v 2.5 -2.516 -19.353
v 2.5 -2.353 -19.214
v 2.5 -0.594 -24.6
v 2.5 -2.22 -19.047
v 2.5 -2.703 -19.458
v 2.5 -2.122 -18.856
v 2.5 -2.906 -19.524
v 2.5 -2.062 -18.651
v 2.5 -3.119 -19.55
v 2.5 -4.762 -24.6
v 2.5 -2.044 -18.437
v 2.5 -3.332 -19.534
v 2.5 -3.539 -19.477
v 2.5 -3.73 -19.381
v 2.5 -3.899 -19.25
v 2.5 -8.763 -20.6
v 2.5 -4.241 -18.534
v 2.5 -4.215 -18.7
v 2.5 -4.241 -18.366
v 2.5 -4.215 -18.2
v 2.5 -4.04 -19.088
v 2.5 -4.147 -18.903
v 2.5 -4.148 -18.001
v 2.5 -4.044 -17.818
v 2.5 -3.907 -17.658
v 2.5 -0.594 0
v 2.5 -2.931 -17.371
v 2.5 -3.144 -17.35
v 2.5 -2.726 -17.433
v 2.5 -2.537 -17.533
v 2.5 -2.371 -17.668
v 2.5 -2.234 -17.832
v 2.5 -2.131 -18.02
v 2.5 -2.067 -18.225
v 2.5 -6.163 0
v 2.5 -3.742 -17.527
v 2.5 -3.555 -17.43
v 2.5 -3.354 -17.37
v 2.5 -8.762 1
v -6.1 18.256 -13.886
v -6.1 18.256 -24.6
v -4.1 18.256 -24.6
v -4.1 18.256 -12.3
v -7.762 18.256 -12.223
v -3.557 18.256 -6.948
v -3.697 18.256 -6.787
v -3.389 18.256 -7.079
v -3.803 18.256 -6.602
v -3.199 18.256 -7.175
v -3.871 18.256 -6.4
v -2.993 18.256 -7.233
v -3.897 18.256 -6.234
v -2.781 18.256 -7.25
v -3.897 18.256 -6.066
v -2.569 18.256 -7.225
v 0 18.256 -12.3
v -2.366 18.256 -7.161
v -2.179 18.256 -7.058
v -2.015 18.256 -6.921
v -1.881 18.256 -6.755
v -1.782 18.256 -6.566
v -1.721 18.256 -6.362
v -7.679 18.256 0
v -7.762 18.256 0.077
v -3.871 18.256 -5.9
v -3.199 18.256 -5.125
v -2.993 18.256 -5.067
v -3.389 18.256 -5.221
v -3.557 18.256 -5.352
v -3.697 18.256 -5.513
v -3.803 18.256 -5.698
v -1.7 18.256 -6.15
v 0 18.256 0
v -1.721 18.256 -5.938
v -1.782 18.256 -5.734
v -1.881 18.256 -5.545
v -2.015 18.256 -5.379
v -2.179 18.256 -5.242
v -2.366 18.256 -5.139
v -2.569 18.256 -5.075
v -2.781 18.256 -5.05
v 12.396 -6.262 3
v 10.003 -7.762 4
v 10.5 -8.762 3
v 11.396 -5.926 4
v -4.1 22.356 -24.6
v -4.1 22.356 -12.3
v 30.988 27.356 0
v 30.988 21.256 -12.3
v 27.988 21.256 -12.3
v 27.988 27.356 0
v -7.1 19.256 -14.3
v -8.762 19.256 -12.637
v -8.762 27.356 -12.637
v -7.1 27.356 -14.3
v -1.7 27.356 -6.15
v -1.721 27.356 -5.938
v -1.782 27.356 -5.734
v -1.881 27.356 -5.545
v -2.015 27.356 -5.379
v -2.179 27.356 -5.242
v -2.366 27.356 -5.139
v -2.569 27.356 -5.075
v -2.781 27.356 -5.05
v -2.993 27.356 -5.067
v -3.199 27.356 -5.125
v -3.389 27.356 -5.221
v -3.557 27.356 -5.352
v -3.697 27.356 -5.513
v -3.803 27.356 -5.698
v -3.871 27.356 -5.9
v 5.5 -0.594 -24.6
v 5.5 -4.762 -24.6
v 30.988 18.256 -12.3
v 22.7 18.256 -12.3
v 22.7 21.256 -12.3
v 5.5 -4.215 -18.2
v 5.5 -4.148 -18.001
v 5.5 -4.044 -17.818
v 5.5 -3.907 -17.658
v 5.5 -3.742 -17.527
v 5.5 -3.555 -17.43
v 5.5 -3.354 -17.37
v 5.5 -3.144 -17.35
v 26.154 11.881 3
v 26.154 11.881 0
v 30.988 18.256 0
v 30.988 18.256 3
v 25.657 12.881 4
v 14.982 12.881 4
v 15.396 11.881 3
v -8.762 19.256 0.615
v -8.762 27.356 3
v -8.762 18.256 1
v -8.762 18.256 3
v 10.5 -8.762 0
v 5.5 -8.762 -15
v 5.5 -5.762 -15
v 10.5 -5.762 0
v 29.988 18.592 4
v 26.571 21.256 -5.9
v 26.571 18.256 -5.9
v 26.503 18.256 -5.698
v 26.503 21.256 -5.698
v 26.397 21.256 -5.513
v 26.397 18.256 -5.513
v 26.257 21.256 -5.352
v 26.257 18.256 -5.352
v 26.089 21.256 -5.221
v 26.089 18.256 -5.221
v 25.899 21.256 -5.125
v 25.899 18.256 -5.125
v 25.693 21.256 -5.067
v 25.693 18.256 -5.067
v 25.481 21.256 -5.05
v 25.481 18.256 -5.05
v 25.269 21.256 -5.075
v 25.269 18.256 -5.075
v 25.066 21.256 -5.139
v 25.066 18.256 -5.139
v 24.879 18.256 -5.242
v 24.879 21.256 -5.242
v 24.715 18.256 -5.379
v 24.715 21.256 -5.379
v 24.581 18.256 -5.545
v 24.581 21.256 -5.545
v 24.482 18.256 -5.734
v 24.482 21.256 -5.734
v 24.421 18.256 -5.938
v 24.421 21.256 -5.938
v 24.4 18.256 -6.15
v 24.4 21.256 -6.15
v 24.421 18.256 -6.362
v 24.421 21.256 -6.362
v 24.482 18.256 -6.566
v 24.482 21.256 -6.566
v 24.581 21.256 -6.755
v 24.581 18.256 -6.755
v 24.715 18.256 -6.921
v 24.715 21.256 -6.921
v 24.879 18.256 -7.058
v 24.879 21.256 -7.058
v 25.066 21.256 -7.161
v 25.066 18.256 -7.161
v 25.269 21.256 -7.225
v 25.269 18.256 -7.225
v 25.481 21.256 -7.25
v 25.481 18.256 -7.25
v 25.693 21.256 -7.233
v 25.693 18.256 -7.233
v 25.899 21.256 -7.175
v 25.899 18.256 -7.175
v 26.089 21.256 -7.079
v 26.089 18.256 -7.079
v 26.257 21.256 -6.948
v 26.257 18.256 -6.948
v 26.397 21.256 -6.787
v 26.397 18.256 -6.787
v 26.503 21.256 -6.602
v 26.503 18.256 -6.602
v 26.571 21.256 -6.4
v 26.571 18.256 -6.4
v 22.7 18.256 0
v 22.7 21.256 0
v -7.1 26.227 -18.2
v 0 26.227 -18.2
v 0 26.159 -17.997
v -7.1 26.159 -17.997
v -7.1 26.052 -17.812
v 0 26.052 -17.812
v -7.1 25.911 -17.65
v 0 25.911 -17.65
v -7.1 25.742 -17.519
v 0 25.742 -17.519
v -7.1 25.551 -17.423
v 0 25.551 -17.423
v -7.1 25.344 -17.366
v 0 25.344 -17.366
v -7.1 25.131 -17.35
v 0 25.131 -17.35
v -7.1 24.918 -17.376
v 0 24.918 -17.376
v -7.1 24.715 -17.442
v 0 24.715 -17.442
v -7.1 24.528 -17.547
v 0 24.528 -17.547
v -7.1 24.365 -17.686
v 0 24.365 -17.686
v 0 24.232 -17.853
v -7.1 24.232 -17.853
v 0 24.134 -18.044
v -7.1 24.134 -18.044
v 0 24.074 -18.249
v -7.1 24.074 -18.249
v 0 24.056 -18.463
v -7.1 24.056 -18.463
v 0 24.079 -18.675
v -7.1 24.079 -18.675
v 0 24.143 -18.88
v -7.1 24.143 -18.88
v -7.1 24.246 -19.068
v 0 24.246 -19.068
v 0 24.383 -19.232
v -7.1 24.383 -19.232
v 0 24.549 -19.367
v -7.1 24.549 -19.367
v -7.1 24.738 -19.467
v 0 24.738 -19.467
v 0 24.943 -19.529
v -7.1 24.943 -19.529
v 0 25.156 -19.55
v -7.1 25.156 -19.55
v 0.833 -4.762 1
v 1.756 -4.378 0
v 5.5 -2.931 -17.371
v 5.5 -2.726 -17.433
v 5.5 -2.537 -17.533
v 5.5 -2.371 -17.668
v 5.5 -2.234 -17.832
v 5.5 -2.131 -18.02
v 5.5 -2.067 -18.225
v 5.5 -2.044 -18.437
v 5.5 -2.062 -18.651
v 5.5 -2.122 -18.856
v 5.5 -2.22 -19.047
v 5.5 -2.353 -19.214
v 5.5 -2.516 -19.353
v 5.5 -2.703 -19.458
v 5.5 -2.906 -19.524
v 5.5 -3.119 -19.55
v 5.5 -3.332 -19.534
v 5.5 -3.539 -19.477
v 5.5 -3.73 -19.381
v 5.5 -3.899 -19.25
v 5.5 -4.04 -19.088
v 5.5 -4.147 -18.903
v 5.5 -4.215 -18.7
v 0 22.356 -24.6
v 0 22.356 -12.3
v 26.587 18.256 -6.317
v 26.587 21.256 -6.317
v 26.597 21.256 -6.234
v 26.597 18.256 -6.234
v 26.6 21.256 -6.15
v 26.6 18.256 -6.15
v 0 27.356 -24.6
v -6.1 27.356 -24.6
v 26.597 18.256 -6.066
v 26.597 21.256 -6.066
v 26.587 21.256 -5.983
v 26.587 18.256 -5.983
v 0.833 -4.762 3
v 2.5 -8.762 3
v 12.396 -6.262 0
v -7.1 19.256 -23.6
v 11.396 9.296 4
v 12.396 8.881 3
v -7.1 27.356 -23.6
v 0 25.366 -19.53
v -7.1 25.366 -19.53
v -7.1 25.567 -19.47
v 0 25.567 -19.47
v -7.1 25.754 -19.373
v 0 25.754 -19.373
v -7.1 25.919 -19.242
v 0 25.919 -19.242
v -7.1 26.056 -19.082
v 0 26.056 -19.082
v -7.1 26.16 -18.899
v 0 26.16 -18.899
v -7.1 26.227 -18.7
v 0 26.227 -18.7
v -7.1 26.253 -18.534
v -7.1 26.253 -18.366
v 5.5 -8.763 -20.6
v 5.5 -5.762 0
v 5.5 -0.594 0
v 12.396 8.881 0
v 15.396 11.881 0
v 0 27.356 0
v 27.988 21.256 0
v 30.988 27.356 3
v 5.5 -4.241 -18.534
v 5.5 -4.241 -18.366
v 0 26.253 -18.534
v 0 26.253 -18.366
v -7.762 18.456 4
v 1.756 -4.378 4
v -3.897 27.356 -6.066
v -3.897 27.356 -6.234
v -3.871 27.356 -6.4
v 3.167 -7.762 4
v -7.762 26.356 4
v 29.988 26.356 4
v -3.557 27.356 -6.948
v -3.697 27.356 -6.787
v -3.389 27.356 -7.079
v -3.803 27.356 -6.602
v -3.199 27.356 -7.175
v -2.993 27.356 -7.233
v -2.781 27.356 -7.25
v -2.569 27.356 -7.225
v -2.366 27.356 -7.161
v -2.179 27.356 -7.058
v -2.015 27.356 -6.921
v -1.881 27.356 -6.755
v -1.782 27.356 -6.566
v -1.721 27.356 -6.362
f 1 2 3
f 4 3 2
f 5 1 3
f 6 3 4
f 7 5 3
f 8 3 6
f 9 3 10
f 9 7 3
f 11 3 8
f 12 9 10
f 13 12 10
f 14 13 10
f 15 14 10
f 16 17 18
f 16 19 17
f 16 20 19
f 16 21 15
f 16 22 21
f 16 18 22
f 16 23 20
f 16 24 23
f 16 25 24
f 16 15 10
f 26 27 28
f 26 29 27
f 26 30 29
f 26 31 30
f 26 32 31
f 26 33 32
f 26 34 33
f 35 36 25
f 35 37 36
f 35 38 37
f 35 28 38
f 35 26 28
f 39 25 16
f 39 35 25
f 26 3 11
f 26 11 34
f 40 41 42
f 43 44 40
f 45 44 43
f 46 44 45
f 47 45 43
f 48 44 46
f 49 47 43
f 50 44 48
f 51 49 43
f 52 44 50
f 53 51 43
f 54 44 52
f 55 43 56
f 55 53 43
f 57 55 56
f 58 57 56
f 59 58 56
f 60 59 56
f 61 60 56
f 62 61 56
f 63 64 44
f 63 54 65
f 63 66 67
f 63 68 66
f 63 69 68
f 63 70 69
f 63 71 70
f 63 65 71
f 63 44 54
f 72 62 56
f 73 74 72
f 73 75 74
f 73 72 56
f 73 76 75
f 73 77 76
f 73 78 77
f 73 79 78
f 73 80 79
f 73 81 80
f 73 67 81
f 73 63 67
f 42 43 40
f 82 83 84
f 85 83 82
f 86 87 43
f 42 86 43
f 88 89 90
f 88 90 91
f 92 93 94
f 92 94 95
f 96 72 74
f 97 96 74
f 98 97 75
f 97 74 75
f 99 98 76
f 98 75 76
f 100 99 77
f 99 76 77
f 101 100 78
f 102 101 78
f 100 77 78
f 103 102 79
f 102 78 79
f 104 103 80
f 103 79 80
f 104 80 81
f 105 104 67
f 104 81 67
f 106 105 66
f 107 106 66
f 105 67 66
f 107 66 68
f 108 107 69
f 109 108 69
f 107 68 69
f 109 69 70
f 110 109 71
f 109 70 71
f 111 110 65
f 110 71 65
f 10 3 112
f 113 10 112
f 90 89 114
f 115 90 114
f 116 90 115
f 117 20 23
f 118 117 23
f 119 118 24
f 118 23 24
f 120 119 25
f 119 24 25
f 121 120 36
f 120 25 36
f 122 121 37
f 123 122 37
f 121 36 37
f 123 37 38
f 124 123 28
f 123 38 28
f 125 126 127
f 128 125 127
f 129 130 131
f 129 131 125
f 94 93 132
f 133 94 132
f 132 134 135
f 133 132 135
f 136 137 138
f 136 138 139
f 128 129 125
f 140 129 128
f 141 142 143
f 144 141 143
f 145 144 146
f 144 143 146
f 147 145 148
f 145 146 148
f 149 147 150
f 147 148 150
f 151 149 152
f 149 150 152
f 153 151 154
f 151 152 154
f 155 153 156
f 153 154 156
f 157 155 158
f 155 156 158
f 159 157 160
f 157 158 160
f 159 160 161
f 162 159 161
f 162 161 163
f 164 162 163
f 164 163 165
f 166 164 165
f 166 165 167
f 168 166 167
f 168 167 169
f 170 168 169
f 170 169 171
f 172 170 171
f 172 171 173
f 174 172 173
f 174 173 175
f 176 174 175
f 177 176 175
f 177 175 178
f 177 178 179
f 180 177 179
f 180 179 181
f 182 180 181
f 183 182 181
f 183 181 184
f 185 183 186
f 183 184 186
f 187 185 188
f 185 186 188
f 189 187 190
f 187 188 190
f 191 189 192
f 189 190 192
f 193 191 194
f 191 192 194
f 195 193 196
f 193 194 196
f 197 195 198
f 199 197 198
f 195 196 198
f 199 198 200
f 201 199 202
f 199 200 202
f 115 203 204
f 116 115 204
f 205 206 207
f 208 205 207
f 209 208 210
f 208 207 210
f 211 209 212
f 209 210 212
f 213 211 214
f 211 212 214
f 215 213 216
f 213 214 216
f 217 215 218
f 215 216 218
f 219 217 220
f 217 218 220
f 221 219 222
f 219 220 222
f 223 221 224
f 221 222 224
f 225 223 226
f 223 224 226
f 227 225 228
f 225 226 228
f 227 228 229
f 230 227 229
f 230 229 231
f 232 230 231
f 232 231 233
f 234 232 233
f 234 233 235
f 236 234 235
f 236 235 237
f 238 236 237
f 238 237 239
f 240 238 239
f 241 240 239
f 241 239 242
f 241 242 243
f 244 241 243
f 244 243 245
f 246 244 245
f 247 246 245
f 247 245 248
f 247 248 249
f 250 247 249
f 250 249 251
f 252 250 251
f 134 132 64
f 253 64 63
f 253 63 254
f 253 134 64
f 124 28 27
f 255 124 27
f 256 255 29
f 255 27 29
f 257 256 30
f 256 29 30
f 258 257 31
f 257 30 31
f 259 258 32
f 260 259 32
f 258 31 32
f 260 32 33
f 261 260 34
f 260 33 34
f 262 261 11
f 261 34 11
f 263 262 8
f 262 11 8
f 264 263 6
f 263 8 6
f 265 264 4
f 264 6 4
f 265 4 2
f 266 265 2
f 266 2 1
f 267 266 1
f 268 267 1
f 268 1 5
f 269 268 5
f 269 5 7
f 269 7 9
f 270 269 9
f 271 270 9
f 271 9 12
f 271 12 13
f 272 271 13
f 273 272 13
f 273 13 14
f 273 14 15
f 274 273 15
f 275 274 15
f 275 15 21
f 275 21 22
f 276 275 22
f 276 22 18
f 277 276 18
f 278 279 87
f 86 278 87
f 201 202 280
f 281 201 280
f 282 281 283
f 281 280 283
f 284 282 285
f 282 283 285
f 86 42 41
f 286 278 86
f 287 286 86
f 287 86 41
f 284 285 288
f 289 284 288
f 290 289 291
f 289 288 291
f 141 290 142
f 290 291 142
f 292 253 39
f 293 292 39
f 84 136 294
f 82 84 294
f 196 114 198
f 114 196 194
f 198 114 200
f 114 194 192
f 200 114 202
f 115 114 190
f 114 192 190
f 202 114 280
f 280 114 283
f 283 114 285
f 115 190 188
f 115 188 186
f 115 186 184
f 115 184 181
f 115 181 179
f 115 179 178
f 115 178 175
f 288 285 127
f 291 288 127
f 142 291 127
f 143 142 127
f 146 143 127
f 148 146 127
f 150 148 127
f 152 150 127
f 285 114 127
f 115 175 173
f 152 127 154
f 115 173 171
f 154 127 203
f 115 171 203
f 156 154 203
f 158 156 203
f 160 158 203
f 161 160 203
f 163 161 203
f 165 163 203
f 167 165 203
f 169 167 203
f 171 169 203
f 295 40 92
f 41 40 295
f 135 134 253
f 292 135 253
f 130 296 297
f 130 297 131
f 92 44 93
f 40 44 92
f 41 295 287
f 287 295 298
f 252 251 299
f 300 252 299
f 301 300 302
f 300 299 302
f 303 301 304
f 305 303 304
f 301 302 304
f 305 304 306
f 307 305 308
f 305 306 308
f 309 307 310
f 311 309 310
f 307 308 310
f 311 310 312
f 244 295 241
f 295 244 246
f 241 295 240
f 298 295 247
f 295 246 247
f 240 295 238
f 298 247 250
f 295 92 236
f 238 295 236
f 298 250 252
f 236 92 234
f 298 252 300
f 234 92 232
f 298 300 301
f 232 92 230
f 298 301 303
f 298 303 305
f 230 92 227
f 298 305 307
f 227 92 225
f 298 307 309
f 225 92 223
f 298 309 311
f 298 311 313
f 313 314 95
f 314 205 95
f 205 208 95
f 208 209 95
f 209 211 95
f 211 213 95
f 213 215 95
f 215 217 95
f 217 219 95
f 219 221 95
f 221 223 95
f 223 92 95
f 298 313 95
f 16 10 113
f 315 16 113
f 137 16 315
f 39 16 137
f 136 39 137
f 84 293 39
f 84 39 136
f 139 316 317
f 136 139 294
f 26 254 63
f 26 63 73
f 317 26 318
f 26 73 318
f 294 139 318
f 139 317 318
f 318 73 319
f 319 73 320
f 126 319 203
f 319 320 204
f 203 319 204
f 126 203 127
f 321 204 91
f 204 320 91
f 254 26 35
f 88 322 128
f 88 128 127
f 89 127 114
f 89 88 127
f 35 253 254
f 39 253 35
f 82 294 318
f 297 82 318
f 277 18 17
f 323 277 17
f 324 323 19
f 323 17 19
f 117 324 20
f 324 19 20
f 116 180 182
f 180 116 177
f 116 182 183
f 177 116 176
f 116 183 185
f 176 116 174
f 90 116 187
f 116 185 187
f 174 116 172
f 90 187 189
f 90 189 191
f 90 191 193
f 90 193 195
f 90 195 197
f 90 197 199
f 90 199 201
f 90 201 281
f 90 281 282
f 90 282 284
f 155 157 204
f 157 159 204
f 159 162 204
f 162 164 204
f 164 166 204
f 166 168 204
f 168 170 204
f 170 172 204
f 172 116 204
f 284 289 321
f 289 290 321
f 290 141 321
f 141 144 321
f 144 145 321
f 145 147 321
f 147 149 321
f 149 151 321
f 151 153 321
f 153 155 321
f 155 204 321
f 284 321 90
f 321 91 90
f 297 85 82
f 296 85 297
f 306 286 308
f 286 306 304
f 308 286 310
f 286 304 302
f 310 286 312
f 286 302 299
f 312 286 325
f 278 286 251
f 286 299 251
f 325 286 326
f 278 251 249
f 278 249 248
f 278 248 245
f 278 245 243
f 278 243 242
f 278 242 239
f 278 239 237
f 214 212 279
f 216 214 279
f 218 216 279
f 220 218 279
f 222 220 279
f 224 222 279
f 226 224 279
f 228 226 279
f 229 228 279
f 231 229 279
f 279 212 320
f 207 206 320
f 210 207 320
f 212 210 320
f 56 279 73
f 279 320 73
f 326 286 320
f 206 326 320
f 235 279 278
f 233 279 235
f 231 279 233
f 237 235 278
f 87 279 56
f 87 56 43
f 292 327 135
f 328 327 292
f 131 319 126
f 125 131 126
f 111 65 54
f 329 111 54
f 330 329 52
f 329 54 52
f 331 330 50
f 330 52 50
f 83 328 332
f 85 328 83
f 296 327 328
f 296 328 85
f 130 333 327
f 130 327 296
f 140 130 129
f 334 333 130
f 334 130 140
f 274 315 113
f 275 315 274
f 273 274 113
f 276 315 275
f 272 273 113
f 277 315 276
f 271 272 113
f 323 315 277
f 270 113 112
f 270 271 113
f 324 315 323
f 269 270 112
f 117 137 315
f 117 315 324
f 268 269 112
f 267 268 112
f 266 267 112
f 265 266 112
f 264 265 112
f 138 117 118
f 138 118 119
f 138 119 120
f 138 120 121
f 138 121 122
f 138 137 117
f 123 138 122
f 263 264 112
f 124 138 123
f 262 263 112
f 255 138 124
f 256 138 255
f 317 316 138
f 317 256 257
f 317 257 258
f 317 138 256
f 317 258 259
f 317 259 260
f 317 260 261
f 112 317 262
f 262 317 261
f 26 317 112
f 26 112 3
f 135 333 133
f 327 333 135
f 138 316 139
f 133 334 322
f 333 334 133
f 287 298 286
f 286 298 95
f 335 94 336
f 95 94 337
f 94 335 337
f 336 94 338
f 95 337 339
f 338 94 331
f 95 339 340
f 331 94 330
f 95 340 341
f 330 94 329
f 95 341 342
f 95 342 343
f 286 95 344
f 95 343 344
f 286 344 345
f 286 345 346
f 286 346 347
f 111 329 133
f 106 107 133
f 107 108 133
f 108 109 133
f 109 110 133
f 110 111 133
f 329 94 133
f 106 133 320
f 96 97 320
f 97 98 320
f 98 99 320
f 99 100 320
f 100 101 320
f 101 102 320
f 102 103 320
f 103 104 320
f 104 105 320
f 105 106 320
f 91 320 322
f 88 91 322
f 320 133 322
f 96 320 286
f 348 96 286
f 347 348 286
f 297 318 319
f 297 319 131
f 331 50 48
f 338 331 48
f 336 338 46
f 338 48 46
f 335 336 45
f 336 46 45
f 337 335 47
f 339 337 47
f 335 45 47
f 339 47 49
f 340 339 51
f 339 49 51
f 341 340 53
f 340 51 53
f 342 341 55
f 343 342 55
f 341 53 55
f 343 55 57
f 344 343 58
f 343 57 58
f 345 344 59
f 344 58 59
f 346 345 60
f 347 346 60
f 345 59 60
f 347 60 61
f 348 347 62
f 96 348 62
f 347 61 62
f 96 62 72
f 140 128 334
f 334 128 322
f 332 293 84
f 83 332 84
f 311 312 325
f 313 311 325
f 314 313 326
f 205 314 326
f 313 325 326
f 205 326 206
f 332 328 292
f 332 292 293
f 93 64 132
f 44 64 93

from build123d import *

# Parameters (mm, degrees)
BOSS_EXTRUDE1_DEPTH = 4
BOSS_EXTRUDE2_DEPTH = 24.6
BOSS_EXTRUDE3_DEPTH = 12.3
BOSS_EXTRUDE4_DEPTH = 12.3
BOSS_EXTRUDE5_DEPTH = 12.3
BOSS_EXTRUDE6_DEPTH = 3
CHAMFER1_SIZE       = 4
CHAMFER4_SIZE       = 2
CHAMFER5_SIZE       = 1
BOSS_EXTRUDE7_DEPTH = 3
CHAMFER8_SIZE       = 3
CHAMFER7_SIZE       = 1
CUT_EXTRUDE1_REACH  = 48.53
CUT_EXTRUDE2_REACH  = 50.101
CUT_EXTRUDE3_REACH  = 49.91
CUT_EXTRUDE4_REACH  = 49.91


with BuildPart() as part:
    # Sketch1 → Boss-Extrude1 (new body)
    with BuildSketch(Plane.XY):
        Polygon((-8.7625, 27.356), (-8.7625, 18.256), (0.832623943, -4.7625), (2.5, -8.7625), (10.5, -8.7625), (12.39611144, -6.261946641), (12.39611144, 11.881414246), (26.153799919, 11.881414246), (30.9875, 18.256), (30.9875, 27.356), align=None)
    extrude(amount=BOSS_EXTRUDE1_DEPTH)

    # Sketch1<5> → Boss-Extrude2 (add)
    with BuildSketch(Plane.XY):
        Polygon((2.5, -5.094), (2.5, -8.7625), (5.5, -8.7625), (5.5, -0.594), (2.5, -0.594), align=None)
    extrude(amount=-BOSS_EXTRUDE2_DEPTH)

    # Sketch2 → Boss-Extrude3 (add)
    with BuildSketch(Plane(origin=(0, 0, 0), x_dir=(-1, 0, 0), z_dir=(0, 0, -1))):
        Polygon((-27.45, 18.256), (-22.7, 18.256), (-22.7, 21.256), (-30.9875, 21.256), (-30.9875, 18.256), align=None)
    extrude(amount=BOSS_EXTRUDE3_DEPTH)

    # Sketch3 → Boss-Extrude4 (add)
    with BuildSketch(Plane(origin=(0, 0, 0), x_dir=(-1, 0, 0), z_dir=(0, 0, -1))):
        Polygon((0, 18.256), (4.75, 18.256), (8.7625, 18.256), (8.7625, 27.356), (0, 27.356), (0, 22.106), align=None)
    extrude(amount=BOSS_EXTRUDE4_DEPTH)

    # Sketch4 → Boss-Extrude5 (add)
    with BuildSketch(Plane(origin=(0, 0, -12.3), x_dir=(-1, 0, 0), z_dir=(0, 0, -1))):
        Polygon((4.1, 22.106), (4.1, 18.256), (7.1, 18.256), (7.1, 27.356), (0, 27.356), (0, 22.356), (3.85, 22.356), (4.1, 22.356), align=None)
    extrude(amount=BOSS_EXTRUDE5_DEPTH)

    # Sketch5 → Boss-Extrude6 (add)
    with BuildSketch(Plane.XZ.offset(8.7625)):
        Polygon((5.5, -15), (10.5, 0), (5.5, 0), align=None)
    extrude(amount=-BOSS_EXTRUDE6_DEPTH)

    # Chamfer1
    chamfer1_edges = [part.edges().sort_by_distance(p)[0] for p in [
        (4, -8.7625, -24.6),
    ]]
    chamfer(chamfer1_edges, length=CHAMFER1_SIZE)

    # Chamfer4
    # the kernel refuses this chamfer: 2 mm, written as the material it adds along each edge
    with BuildSketch(Plane(origin=(-7.1, 18.256, -12.3), x_dir=(-0.9996219169112973, 0, 0.027495876610566645), z_dir=(0, 1, 0))) as chamfer4_piece_1_section:
        Polygon((CHAMFER4_SIZE * 0.999621916911, -CHAMFER4_SIZE * 0.0274958766106), (-CHAMFER4_SIZE * 0.0274958766106, -CHAMFER4_SIZE * 0.999621916911), (0, 0), align=None)
    chamfer4_piece_1 = extrude(amount=9.1, mode=Mode.PRIVATE)
    chamfer4_piece_1 = split(chamfer4_piece_1, bisect_by=Plane(origin=(-8.7625, 22.806, -12.984491238), z_dir=(1, 0, 0)), keep=Keep.TOP, mode=Mode.PRIVATE)
    add(chamfer4_piece_1)

    # Chamfer5
    chamfer5_edges = [part.edges().sort_by_distance(p)[0] for p in [
        (-7.93125, 18.256, -13.46875),
        (-8.7625, 18.256, -6.31875),
        (-7.1, 22.806, -24.6),
        (-7.1, 18.256, -19.45),
    ]]
    chamfer(chamfer5_edges, length=CHAMFER5_SIZE)

    # Sketch6 → Boss-Extrude7 (add)
    with BuildSketch(Plane(origin=(30.9875, 0, 0), x_dir=(0, 0, -1), z_dir=(1, 0, 0))):
        Polygon((12.3, 21.256), (0, 27.356), (-0.5, 27.356), (-0.5, 20.756), (12.3, 20.756), align=None)
    extrude(amount=-BOSS_EXTRUDE7_DEPTH)

    # Chamfer8
    chamfer8_edges = [part.edges().sort_by_distance(p)[0] for p in [
        (12.39611144, 11.881414246, 2),
    ]]
    chamfer(chamfer8_edges, length=CHAMFER8_SIZE)

    # Chamfer7
    chamfer7_edges = [part.edges().sort_by_distance(p)[0] for p in [
        (11.44805572, -7.51222332, 4),
        (-3.13125, 4.74675, 0),
        (12.39611144, 1.309733803, 4),
        (13.89611144, 10.381414246, 4),
        (20.77495568, 11.881414246, 4),
        (28.57064996, 15.068707123, 4),
        (30.9875, 22.806, 4),
        (11.1125, 27.356, 4),
        (-8.7625, 22.806, 4),
        (-3.13125, 4.74675, 4),
        (6.5, -8.7625, 4),
    ]]
    chamfer(chamfer7_edges, length=CHAMFER7_SIZE)

    # Sketch7 → Cut-Extrude1 (cut, up to next)
    with BuildSketch(Plane.ZY.offset(-2.5), mode=Mode.PRIVATE) as cut_extrude1_sk1:
        with BuildLine():
            ThreePointArc((-18.7, -4.215214264), (-18.45, -4.244), (-18.2, -4.215214264))
            ThreePointArc((-18.2, -4.215214264), (-17.588315603, -3.827739717), (-17.35, -3.144))
            ThreePointArc((-17.35, -3.144), (-19.133739717, -2.282315603), (-18.7, -4.215214264))
        make_face()
    cut_extrude1_tool1 = extrude(cut_extrude1_sk1.sketch, amount=-CUT_EXTRUDE1_REACH, mode=Mode.PRIVATE) & part.part
    add(cut_extrude1_tool1.solids().sort_by_distance((2.5, -3.144, -18.45))[0], mode=Mode.SUBTRACT)

    # Sketch8 → Cut-Extrude2 (cut, up to next)
    with BuildSketch(Plane(origin=(0, 0, 0), x_dir=(0, 0, -1), z_dir=(1, 0, 0)), mode=Mode.PRIVATE) as cut_extrude2_sk1:
        with BuildLine():
            ThreePointArc((18.7, 26.227214264), (18.45, 26.256), (18.2, 26.227214264))
            ThreePointArc((18.2, 26.227214264), (17.766260283, 24.294315603), (19.55, 25.156))
            ThreePointArc((19.55, 25.156), (19.311684397, 25.839739717), (18.7, 26.227214264))
        make_face()
    cut_extrude2_tool1 = extrude(cut_extrude2_sk1.sketch, amount=-CUT_EXTRUDE2_REACH, mode=Mode.PRIVATE) & part.part
    add(cut_extrude2_tool1.solids().sort_by_distance((0, 25.156, -18.45))[0], mode=Mode.SUBTRACT)

    # Sketch9 → Cut-Extrude3 (cut, up to next)
    with BuildSketch(Plane.XZ.offset(-18.256), mode=Mode.PRIVATE) as cut_extrude3_sk1:
        with BuildLine():
            ThreePointArc((-3.871214264, -5.9), (-3.9, -6.15), (-3.871214264, -6.4))
            ThreePointArc((-3.871214264, -6.4), (-2.67417411, -7.24277987), (-1.7, -6.15))
            ThreePointArc((-1.7, -6.15), (-2.67417411, -5.05722013), (-3.871214264, -5.9))
        make_face()
    cut_extrude3_tool1 = extrude(cut_extrude3_sk1.sketch, amount=-CUT_EXTRUDE3_REACH, mode=Mode.PRIVATE) & part.part
    add(cut_extrude3_tool1.solids().sort_by_distance((-2.8, 18.256, -6.15))[0], mode=Mode.SUBTRACT)

    # Sketch10 → Cut-Extrude4 (cut, up to next)
    with BuildSketch(Plane.XZ.offset(-18.256), mode=Mode.PRIVATE) as cut_extrude4_sk1:
        with BuildLine():
            ThreePointArc((26.6, -6.15), (26.59277987, -6.02417411), (26.571214264, -5.9))
            ThreePointArc((26.571214264, -5.9), (24.4, -6.15), (26.571214264, -6.4))
            ThreePointArc((26.571214264, -6.4), (26.59277987, -6.27582589), (26.6, -6.15))
        make_face()
    cut_extrude4_tool1 = extrude(cut_extrude4_sk1.sketch, amount=-CUT_EXTRUDE4_REACH, mode=Mode.PRIVATE) & part.part
    add(cut_extrude4_tool1.solids().sort_by_distance((25.5, 18.256, -6.15))[0], mode=Mode.SUBTRACT)


solid = part.part
